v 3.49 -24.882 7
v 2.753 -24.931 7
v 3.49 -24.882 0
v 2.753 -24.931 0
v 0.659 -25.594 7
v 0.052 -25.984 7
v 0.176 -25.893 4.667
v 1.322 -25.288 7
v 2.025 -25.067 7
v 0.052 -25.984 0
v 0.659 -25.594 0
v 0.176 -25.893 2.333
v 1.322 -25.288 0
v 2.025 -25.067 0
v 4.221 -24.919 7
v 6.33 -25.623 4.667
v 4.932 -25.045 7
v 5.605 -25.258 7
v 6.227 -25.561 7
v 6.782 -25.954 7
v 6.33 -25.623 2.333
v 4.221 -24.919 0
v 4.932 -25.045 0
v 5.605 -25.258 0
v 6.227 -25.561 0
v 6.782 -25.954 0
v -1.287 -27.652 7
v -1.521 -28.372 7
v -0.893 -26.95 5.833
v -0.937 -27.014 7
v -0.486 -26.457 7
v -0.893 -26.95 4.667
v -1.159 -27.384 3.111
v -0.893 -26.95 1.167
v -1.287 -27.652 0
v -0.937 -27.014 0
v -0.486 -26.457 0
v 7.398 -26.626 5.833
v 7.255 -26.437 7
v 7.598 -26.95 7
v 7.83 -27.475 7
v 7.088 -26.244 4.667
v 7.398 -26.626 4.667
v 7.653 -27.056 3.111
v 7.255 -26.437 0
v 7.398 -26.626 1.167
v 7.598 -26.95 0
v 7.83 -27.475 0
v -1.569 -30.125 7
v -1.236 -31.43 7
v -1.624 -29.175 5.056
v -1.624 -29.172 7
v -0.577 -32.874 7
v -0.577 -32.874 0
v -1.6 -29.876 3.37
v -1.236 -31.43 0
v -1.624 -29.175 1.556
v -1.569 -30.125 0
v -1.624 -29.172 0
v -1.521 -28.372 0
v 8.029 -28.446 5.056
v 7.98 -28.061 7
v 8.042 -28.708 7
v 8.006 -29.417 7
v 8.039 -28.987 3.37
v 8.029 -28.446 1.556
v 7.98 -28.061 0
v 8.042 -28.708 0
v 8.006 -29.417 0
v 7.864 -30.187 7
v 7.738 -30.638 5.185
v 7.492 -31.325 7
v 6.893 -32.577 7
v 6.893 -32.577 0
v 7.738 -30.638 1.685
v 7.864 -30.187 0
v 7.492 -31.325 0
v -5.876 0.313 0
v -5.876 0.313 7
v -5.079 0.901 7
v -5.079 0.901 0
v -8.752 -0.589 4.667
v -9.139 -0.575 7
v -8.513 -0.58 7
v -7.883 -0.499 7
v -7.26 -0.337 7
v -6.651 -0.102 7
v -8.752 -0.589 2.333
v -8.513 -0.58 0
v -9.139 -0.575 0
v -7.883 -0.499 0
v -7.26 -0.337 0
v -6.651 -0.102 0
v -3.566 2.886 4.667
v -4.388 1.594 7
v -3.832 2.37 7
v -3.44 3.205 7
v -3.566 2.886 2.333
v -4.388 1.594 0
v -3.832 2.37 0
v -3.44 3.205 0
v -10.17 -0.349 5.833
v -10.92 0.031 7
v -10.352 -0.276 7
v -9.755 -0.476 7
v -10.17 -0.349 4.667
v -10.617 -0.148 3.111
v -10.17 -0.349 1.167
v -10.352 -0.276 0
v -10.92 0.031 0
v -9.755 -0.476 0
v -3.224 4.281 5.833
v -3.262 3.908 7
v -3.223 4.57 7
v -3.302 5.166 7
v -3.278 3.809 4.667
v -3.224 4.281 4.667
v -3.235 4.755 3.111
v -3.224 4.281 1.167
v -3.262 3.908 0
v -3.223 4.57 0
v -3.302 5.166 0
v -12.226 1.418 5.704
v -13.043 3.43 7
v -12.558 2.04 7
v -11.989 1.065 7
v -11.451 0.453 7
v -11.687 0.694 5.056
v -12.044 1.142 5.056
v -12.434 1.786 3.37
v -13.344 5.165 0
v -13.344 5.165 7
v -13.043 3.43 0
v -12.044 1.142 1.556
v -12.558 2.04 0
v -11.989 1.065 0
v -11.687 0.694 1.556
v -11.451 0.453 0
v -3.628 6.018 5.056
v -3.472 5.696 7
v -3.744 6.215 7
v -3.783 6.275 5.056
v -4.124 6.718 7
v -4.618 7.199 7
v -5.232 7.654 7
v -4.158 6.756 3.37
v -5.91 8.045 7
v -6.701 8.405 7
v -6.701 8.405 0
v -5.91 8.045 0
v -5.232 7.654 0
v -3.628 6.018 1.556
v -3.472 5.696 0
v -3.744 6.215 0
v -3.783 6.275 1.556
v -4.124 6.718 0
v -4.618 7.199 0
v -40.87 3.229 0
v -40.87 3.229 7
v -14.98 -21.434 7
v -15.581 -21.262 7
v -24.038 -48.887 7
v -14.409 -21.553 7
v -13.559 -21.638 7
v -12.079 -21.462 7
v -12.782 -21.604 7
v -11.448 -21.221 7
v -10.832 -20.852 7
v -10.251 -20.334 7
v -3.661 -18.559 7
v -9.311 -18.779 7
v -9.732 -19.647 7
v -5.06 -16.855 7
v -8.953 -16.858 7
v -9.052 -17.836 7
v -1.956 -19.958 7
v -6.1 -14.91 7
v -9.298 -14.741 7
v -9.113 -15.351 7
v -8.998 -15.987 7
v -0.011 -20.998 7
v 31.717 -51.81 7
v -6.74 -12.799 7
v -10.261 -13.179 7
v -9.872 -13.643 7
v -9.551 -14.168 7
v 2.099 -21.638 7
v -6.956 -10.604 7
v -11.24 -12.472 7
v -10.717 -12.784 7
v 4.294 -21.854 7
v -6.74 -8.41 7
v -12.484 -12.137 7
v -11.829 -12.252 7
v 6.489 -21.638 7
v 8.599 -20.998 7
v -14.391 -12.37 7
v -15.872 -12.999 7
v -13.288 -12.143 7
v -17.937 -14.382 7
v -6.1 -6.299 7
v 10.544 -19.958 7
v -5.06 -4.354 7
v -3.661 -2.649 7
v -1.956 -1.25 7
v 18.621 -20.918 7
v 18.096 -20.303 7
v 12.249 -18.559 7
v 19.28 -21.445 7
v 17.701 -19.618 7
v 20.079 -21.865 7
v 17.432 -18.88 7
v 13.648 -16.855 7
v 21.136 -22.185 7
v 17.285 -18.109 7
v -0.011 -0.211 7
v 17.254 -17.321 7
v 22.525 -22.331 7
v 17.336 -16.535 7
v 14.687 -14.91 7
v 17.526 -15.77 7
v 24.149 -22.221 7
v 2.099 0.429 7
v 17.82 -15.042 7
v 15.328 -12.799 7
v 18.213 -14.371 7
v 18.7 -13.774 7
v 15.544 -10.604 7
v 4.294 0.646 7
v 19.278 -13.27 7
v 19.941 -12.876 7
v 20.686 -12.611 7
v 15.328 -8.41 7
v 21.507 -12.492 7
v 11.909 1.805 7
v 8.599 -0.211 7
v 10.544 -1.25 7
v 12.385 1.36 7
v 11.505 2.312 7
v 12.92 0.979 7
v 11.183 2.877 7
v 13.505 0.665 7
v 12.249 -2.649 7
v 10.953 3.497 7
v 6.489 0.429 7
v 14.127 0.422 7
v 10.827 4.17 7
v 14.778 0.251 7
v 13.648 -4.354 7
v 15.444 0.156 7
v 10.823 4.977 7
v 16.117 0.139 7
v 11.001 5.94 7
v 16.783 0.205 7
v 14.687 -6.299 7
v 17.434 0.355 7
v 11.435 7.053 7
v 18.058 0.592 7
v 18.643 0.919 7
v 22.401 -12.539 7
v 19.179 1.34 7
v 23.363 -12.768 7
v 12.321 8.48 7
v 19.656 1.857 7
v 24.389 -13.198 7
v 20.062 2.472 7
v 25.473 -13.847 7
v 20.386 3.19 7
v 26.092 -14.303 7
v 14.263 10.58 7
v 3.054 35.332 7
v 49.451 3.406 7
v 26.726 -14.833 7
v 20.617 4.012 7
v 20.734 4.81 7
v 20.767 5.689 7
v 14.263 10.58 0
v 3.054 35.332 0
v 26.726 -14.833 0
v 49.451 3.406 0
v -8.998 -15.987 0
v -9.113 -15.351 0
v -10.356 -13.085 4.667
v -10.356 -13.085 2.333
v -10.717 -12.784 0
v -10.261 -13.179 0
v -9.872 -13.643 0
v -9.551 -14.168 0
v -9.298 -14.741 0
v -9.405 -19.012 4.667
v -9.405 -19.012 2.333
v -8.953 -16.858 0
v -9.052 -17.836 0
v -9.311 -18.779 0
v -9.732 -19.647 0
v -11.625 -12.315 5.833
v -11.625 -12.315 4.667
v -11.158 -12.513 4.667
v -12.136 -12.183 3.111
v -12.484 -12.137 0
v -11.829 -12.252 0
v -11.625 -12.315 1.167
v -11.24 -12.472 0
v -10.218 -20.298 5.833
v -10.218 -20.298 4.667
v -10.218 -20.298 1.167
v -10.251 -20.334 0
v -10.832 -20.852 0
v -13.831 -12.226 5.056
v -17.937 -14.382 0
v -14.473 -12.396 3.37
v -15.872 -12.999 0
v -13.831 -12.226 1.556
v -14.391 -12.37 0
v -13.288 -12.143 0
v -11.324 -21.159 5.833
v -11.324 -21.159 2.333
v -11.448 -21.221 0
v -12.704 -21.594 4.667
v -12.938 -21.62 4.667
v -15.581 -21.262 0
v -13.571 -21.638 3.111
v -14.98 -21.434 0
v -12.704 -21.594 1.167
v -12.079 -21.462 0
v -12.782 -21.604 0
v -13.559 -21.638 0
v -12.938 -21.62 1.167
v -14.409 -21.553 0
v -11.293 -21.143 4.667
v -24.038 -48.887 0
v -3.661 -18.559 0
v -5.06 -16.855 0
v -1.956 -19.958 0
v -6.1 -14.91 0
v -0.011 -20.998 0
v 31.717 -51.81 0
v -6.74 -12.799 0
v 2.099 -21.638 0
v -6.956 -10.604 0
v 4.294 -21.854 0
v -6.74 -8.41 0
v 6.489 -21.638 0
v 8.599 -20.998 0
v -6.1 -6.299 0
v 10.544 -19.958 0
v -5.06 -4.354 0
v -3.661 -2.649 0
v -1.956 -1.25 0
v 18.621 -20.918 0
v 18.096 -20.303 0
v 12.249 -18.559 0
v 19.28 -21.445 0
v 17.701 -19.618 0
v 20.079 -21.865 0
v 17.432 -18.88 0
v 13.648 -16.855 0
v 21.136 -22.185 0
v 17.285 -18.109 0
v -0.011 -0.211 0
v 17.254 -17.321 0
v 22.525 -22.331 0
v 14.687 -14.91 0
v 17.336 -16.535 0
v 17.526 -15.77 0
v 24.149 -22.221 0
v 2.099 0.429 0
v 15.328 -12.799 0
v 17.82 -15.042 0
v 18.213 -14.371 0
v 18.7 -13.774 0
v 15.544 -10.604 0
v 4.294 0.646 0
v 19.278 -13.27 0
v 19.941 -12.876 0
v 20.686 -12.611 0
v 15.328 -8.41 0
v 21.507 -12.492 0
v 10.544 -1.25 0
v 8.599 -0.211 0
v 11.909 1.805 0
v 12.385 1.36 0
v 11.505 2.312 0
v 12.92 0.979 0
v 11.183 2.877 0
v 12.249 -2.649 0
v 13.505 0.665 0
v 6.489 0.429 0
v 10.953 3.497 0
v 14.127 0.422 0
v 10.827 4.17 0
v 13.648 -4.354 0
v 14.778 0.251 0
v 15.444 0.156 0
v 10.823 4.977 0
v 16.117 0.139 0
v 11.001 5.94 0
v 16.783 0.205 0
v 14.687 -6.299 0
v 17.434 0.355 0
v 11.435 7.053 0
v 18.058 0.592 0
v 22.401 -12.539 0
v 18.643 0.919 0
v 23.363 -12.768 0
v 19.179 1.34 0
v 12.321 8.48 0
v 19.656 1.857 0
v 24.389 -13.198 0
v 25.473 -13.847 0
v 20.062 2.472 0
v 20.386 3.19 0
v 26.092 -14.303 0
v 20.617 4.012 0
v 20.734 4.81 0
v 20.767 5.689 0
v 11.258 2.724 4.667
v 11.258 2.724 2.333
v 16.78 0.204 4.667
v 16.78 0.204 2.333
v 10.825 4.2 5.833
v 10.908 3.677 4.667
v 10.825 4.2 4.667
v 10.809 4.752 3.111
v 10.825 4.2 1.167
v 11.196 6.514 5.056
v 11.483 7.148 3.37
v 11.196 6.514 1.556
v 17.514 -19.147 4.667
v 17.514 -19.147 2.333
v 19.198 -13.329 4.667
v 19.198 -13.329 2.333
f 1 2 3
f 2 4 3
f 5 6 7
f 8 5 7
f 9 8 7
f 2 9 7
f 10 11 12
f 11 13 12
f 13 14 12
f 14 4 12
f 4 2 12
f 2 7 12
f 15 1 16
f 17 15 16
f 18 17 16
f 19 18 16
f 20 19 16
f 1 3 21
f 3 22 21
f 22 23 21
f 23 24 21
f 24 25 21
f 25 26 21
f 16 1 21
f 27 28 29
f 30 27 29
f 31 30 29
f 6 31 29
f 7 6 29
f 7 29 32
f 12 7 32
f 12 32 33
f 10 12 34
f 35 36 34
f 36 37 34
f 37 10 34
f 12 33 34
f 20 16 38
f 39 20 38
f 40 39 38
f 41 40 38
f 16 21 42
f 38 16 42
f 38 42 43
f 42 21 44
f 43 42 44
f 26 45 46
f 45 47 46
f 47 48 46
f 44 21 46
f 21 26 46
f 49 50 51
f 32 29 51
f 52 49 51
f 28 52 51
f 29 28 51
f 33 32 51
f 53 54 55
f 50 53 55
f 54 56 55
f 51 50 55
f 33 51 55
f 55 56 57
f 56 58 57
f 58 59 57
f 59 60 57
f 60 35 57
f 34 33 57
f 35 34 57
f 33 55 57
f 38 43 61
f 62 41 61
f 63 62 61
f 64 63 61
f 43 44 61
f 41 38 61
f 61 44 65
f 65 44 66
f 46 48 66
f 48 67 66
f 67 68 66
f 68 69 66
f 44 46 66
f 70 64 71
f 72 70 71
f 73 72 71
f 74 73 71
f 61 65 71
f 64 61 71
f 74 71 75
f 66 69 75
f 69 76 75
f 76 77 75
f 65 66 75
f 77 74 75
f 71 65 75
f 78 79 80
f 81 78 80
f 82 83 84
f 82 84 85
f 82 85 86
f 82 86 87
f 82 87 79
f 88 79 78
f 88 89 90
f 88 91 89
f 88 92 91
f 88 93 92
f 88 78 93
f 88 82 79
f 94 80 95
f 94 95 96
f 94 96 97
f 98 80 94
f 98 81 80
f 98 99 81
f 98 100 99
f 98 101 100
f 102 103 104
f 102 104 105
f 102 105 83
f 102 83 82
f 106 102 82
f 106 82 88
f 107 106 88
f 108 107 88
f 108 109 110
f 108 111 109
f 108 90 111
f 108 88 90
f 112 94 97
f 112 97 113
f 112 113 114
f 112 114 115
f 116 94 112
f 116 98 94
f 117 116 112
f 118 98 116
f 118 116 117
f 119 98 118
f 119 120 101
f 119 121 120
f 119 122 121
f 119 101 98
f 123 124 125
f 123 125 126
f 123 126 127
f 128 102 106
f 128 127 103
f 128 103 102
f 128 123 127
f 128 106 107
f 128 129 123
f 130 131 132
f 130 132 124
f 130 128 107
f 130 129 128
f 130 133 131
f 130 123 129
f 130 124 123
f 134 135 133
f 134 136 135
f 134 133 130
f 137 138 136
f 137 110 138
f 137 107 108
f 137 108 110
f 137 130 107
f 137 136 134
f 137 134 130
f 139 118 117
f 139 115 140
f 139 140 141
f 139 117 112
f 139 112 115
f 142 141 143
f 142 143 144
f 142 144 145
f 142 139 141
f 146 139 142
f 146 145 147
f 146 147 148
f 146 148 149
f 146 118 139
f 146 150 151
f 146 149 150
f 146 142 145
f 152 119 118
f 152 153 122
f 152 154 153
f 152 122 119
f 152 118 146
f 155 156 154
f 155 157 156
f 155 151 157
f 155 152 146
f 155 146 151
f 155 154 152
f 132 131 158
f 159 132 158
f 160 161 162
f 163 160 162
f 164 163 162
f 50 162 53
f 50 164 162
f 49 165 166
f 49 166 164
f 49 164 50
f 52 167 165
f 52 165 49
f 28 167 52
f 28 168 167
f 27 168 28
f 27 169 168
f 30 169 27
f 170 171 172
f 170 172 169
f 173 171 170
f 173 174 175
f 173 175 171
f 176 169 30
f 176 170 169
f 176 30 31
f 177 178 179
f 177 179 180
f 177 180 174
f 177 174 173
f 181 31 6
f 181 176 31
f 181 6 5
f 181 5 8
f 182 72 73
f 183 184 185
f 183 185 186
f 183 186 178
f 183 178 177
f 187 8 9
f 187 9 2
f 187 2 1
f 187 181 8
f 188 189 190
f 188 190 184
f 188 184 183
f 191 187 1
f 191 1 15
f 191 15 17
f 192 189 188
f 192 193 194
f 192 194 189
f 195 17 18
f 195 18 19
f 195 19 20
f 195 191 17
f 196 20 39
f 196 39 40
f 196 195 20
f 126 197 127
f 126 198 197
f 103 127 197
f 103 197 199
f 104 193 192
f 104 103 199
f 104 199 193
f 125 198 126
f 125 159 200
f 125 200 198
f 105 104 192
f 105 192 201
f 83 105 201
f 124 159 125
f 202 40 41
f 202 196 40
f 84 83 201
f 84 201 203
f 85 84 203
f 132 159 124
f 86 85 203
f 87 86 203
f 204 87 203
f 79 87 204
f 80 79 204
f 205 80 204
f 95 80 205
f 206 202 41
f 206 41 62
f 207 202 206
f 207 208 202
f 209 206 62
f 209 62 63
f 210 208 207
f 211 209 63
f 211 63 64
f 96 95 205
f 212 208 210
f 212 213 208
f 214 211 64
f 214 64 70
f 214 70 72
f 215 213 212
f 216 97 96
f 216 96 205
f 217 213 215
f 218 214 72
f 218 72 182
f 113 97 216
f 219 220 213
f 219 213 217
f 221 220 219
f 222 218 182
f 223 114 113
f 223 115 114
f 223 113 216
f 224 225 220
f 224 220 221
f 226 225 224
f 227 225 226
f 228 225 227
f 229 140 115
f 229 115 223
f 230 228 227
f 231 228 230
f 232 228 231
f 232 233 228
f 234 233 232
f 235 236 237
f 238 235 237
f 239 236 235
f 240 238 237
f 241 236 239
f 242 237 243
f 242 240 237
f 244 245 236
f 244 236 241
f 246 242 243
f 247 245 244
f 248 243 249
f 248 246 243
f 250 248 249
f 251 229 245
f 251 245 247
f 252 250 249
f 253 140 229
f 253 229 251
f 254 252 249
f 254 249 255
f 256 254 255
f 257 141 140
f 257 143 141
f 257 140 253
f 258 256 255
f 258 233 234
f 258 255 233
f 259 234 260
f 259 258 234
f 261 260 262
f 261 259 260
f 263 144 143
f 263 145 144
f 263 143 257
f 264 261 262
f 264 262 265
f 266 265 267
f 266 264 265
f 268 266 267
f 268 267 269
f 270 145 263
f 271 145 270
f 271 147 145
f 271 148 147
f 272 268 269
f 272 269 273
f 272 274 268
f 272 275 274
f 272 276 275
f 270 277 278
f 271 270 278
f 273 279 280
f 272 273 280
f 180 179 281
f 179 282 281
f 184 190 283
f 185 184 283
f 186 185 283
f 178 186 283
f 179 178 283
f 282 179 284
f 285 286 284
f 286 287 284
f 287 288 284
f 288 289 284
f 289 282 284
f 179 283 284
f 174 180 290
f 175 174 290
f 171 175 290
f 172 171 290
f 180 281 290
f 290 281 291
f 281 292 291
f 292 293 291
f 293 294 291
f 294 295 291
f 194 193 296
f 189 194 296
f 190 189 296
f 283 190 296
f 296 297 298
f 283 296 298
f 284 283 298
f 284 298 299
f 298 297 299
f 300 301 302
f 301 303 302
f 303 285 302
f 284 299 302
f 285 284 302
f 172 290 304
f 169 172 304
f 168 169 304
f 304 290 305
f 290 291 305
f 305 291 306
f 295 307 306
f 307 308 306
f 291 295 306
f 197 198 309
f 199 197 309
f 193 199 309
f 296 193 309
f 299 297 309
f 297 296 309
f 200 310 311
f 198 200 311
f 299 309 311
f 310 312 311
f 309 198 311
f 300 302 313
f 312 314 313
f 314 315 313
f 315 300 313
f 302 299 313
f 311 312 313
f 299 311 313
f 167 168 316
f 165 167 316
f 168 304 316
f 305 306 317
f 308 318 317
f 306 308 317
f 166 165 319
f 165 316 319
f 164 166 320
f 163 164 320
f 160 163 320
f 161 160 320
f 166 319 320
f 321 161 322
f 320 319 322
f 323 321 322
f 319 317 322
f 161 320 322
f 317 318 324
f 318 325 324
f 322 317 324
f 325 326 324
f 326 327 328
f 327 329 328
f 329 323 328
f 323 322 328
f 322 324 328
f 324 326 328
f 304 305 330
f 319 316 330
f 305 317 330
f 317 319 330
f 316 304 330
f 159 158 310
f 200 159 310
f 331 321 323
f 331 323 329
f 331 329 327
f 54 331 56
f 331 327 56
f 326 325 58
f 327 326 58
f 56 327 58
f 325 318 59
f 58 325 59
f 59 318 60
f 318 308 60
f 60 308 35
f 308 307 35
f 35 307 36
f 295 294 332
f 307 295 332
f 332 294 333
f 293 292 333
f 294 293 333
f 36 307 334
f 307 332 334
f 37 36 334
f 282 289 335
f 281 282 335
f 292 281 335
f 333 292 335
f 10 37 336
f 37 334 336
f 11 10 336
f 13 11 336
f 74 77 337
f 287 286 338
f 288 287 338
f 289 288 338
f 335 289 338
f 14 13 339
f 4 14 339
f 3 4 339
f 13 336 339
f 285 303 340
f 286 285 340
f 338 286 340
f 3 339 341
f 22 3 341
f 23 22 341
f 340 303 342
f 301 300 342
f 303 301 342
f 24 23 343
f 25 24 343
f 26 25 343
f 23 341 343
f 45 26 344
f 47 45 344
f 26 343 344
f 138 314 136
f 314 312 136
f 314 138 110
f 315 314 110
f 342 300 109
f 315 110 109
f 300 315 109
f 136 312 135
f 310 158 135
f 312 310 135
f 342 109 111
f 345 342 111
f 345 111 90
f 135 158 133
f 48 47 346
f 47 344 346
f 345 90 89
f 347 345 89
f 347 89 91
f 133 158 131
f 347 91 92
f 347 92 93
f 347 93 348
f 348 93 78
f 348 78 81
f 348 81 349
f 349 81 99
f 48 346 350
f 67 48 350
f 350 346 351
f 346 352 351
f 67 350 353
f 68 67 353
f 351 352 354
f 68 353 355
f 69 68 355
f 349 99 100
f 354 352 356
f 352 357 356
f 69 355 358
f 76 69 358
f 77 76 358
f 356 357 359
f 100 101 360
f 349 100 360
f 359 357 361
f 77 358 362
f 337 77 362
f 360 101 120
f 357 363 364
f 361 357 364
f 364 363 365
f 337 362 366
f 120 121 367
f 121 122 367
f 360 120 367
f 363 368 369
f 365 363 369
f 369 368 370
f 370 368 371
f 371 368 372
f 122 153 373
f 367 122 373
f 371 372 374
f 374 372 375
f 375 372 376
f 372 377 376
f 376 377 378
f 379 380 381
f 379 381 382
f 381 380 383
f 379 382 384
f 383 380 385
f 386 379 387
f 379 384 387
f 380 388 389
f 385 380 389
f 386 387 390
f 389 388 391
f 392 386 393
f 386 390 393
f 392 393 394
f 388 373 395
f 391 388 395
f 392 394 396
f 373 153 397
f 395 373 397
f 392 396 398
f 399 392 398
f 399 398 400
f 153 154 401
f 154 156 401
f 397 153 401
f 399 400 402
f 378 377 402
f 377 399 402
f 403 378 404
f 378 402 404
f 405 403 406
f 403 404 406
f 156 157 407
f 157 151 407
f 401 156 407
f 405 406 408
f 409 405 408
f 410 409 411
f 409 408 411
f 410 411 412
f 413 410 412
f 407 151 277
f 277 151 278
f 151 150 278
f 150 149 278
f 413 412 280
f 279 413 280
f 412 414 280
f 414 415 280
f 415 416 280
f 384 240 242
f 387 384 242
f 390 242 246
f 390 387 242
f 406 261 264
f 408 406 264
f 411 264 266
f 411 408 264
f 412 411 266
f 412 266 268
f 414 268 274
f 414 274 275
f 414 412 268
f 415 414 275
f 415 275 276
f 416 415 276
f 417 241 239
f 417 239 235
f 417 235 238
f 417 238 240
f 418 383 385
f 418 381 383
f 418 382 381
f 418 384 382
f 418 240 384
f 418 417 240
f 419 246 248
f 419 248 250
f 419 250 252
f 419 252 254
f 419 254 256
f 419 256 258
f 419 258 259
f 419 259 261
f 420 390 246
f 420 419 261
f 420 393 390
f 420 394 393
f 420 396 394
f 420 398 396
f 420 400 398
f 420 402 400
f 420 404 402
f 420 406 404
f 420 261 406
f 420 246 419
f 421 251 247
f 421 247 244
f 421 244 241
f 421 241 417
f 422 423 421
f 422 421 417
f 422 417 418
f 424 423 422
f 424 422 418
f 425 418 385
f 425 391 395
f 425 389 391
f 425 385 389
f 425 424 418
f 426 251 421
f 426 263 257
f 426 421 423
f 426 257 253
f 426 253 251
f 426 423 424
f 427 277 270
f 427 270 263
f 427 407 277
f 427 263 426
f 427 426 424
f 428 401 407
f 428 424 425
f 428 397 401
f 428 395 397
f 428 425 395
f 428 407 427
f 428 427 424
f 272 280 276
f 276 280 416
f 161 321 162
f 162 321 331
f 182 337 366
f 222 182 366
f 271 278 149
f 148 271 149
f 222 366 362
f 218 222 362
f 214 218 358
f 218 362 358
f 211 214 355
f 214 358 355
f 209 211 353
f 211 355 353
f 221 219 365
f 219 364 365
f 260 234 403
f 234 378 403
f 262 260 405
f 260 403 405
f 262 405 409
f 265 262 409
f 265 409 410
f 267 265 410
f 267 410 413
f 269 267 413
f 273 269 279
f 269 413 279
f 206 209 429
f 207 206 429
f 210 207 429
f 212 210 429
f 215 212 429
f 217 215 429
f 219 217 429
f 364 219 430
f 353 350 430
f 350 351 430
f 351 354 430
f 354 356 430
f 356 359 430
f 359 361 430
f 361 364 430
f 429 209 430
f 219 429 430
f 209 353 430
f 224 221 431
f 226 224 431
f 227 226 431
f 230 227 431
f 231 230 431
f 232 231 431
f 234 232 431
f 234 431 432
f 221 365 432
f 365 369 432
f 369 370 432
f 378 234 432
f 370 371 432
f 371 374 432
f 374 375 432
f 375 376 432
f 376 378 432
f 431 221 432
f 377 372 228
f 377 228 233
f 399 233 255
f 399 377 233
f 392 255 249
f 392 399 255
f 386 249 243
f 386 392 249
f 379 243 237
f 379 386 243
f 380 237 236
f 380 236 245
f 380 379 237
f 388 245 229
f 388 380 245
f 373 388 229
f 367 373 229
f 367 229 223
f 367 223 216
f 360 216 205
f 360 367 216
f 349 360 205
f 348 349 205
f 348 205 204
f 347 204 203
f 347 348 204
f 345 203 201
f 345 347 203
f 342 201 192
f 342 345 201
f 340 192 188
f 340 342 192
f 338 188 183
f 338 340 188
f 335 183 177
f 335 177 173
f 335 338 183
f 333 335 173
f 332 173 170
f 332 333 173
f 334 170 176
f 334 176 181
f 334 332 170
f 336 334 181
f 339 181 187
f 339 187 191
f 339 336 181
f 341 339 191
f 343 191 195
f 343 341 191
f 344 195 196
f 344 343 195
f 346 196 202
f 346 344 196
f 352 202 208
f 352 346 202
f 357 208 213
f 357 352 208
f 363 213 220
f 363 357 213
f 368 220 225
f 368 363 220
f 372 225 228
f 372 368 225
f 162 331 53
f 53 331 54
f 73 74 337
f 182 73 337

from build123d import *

# Parameters (mm, degrees)
F0_R     = 11.25
F1_DEPTH = 7


with BuildPart() as f1:
    # F0 (on Top) → F1 (new body)
    with BuildSketch(Plane.XY):
        with BuildLine():
            Line((3.053512, 35.332328), (-6.700666, 8.404746))
            add(Edge.make_bspline(
                [(-13.344336, 5.164926), (-12.019685, -7.597877), (3.565281, 4.258171), (-6.700666, 8.404746)],
                knots=[0, 0, 0, 0, 7.391535, 7.391535, 7.391535, 7.391535], degree=3))
            Line((-13.344336, 5.164926), (-40.870471, 3.228944))
            Line((-40.870471, 3.228944), (-17.937381, -14.382361))
            add(Edge.make_bspline(
                [(-17.937381, -14.382361), (-7.205485, -5.840566), (-5.676269, -24.48345), (-15.58056, -21.261975)],
                knots=[0, 0, 0, 0, 7.272117, 7.272117, 7.272117, 7.272117], degree=3))
            Line((-15.58056, -21.261975), (-24.037964, -48.886847))
            Line((-24.037964, -48.886847), (-0.577154, -32.873667))
            add(Edge.make_bspline(
                [(-0.577154, -32.873667), (-6.186889, -22.709077), (12.788273, -21.840621), (6.892902, -32.576927)],
                knots=[0, 0, 0, 0, 7.475948, 7.475948, 7.475948, 7.475948], degree=3))
            Line((6.892902, -32.576927), (31.716839, -51.809535))
            Line((31.716839, -51.809535), (24.148522, -22.221368))
            add(Edge.make_bspline(
                [(24.148522, -22.221368), (12.527963, -23.872861), (17.102542, -6.313425), (26.725877, -14.832847)],
                knots=[0, 0, 0, 0, 7.825152, 7.825152, 7.825152, 7.825152], degree=3))
            Line((26.725877, -14.832847), (49.450749, 3.405918))
            Line((49.450749, 3.405918), (20.766794, 5.689487))
            add(Edge.make_bspline(
                [(14.262746, 10.579666), (3.641411, 0.945837), (20.901213, -4.688121), (20.766794, 5.689487)],
                knots=[0, 0, 0, 0, 8.137351, 8.137351, 8.137351, 8.137351], degree=3))
            Line((14.262746, 10.579666), (3.053512, 35.332328))
        make_face()
        with Locations((4.293832, -10.60445)):
            Circle(F0_R, mode=Mode.SUBTRACT)
    extrude(amount=F1_DEPTH)


solid = f1.part
